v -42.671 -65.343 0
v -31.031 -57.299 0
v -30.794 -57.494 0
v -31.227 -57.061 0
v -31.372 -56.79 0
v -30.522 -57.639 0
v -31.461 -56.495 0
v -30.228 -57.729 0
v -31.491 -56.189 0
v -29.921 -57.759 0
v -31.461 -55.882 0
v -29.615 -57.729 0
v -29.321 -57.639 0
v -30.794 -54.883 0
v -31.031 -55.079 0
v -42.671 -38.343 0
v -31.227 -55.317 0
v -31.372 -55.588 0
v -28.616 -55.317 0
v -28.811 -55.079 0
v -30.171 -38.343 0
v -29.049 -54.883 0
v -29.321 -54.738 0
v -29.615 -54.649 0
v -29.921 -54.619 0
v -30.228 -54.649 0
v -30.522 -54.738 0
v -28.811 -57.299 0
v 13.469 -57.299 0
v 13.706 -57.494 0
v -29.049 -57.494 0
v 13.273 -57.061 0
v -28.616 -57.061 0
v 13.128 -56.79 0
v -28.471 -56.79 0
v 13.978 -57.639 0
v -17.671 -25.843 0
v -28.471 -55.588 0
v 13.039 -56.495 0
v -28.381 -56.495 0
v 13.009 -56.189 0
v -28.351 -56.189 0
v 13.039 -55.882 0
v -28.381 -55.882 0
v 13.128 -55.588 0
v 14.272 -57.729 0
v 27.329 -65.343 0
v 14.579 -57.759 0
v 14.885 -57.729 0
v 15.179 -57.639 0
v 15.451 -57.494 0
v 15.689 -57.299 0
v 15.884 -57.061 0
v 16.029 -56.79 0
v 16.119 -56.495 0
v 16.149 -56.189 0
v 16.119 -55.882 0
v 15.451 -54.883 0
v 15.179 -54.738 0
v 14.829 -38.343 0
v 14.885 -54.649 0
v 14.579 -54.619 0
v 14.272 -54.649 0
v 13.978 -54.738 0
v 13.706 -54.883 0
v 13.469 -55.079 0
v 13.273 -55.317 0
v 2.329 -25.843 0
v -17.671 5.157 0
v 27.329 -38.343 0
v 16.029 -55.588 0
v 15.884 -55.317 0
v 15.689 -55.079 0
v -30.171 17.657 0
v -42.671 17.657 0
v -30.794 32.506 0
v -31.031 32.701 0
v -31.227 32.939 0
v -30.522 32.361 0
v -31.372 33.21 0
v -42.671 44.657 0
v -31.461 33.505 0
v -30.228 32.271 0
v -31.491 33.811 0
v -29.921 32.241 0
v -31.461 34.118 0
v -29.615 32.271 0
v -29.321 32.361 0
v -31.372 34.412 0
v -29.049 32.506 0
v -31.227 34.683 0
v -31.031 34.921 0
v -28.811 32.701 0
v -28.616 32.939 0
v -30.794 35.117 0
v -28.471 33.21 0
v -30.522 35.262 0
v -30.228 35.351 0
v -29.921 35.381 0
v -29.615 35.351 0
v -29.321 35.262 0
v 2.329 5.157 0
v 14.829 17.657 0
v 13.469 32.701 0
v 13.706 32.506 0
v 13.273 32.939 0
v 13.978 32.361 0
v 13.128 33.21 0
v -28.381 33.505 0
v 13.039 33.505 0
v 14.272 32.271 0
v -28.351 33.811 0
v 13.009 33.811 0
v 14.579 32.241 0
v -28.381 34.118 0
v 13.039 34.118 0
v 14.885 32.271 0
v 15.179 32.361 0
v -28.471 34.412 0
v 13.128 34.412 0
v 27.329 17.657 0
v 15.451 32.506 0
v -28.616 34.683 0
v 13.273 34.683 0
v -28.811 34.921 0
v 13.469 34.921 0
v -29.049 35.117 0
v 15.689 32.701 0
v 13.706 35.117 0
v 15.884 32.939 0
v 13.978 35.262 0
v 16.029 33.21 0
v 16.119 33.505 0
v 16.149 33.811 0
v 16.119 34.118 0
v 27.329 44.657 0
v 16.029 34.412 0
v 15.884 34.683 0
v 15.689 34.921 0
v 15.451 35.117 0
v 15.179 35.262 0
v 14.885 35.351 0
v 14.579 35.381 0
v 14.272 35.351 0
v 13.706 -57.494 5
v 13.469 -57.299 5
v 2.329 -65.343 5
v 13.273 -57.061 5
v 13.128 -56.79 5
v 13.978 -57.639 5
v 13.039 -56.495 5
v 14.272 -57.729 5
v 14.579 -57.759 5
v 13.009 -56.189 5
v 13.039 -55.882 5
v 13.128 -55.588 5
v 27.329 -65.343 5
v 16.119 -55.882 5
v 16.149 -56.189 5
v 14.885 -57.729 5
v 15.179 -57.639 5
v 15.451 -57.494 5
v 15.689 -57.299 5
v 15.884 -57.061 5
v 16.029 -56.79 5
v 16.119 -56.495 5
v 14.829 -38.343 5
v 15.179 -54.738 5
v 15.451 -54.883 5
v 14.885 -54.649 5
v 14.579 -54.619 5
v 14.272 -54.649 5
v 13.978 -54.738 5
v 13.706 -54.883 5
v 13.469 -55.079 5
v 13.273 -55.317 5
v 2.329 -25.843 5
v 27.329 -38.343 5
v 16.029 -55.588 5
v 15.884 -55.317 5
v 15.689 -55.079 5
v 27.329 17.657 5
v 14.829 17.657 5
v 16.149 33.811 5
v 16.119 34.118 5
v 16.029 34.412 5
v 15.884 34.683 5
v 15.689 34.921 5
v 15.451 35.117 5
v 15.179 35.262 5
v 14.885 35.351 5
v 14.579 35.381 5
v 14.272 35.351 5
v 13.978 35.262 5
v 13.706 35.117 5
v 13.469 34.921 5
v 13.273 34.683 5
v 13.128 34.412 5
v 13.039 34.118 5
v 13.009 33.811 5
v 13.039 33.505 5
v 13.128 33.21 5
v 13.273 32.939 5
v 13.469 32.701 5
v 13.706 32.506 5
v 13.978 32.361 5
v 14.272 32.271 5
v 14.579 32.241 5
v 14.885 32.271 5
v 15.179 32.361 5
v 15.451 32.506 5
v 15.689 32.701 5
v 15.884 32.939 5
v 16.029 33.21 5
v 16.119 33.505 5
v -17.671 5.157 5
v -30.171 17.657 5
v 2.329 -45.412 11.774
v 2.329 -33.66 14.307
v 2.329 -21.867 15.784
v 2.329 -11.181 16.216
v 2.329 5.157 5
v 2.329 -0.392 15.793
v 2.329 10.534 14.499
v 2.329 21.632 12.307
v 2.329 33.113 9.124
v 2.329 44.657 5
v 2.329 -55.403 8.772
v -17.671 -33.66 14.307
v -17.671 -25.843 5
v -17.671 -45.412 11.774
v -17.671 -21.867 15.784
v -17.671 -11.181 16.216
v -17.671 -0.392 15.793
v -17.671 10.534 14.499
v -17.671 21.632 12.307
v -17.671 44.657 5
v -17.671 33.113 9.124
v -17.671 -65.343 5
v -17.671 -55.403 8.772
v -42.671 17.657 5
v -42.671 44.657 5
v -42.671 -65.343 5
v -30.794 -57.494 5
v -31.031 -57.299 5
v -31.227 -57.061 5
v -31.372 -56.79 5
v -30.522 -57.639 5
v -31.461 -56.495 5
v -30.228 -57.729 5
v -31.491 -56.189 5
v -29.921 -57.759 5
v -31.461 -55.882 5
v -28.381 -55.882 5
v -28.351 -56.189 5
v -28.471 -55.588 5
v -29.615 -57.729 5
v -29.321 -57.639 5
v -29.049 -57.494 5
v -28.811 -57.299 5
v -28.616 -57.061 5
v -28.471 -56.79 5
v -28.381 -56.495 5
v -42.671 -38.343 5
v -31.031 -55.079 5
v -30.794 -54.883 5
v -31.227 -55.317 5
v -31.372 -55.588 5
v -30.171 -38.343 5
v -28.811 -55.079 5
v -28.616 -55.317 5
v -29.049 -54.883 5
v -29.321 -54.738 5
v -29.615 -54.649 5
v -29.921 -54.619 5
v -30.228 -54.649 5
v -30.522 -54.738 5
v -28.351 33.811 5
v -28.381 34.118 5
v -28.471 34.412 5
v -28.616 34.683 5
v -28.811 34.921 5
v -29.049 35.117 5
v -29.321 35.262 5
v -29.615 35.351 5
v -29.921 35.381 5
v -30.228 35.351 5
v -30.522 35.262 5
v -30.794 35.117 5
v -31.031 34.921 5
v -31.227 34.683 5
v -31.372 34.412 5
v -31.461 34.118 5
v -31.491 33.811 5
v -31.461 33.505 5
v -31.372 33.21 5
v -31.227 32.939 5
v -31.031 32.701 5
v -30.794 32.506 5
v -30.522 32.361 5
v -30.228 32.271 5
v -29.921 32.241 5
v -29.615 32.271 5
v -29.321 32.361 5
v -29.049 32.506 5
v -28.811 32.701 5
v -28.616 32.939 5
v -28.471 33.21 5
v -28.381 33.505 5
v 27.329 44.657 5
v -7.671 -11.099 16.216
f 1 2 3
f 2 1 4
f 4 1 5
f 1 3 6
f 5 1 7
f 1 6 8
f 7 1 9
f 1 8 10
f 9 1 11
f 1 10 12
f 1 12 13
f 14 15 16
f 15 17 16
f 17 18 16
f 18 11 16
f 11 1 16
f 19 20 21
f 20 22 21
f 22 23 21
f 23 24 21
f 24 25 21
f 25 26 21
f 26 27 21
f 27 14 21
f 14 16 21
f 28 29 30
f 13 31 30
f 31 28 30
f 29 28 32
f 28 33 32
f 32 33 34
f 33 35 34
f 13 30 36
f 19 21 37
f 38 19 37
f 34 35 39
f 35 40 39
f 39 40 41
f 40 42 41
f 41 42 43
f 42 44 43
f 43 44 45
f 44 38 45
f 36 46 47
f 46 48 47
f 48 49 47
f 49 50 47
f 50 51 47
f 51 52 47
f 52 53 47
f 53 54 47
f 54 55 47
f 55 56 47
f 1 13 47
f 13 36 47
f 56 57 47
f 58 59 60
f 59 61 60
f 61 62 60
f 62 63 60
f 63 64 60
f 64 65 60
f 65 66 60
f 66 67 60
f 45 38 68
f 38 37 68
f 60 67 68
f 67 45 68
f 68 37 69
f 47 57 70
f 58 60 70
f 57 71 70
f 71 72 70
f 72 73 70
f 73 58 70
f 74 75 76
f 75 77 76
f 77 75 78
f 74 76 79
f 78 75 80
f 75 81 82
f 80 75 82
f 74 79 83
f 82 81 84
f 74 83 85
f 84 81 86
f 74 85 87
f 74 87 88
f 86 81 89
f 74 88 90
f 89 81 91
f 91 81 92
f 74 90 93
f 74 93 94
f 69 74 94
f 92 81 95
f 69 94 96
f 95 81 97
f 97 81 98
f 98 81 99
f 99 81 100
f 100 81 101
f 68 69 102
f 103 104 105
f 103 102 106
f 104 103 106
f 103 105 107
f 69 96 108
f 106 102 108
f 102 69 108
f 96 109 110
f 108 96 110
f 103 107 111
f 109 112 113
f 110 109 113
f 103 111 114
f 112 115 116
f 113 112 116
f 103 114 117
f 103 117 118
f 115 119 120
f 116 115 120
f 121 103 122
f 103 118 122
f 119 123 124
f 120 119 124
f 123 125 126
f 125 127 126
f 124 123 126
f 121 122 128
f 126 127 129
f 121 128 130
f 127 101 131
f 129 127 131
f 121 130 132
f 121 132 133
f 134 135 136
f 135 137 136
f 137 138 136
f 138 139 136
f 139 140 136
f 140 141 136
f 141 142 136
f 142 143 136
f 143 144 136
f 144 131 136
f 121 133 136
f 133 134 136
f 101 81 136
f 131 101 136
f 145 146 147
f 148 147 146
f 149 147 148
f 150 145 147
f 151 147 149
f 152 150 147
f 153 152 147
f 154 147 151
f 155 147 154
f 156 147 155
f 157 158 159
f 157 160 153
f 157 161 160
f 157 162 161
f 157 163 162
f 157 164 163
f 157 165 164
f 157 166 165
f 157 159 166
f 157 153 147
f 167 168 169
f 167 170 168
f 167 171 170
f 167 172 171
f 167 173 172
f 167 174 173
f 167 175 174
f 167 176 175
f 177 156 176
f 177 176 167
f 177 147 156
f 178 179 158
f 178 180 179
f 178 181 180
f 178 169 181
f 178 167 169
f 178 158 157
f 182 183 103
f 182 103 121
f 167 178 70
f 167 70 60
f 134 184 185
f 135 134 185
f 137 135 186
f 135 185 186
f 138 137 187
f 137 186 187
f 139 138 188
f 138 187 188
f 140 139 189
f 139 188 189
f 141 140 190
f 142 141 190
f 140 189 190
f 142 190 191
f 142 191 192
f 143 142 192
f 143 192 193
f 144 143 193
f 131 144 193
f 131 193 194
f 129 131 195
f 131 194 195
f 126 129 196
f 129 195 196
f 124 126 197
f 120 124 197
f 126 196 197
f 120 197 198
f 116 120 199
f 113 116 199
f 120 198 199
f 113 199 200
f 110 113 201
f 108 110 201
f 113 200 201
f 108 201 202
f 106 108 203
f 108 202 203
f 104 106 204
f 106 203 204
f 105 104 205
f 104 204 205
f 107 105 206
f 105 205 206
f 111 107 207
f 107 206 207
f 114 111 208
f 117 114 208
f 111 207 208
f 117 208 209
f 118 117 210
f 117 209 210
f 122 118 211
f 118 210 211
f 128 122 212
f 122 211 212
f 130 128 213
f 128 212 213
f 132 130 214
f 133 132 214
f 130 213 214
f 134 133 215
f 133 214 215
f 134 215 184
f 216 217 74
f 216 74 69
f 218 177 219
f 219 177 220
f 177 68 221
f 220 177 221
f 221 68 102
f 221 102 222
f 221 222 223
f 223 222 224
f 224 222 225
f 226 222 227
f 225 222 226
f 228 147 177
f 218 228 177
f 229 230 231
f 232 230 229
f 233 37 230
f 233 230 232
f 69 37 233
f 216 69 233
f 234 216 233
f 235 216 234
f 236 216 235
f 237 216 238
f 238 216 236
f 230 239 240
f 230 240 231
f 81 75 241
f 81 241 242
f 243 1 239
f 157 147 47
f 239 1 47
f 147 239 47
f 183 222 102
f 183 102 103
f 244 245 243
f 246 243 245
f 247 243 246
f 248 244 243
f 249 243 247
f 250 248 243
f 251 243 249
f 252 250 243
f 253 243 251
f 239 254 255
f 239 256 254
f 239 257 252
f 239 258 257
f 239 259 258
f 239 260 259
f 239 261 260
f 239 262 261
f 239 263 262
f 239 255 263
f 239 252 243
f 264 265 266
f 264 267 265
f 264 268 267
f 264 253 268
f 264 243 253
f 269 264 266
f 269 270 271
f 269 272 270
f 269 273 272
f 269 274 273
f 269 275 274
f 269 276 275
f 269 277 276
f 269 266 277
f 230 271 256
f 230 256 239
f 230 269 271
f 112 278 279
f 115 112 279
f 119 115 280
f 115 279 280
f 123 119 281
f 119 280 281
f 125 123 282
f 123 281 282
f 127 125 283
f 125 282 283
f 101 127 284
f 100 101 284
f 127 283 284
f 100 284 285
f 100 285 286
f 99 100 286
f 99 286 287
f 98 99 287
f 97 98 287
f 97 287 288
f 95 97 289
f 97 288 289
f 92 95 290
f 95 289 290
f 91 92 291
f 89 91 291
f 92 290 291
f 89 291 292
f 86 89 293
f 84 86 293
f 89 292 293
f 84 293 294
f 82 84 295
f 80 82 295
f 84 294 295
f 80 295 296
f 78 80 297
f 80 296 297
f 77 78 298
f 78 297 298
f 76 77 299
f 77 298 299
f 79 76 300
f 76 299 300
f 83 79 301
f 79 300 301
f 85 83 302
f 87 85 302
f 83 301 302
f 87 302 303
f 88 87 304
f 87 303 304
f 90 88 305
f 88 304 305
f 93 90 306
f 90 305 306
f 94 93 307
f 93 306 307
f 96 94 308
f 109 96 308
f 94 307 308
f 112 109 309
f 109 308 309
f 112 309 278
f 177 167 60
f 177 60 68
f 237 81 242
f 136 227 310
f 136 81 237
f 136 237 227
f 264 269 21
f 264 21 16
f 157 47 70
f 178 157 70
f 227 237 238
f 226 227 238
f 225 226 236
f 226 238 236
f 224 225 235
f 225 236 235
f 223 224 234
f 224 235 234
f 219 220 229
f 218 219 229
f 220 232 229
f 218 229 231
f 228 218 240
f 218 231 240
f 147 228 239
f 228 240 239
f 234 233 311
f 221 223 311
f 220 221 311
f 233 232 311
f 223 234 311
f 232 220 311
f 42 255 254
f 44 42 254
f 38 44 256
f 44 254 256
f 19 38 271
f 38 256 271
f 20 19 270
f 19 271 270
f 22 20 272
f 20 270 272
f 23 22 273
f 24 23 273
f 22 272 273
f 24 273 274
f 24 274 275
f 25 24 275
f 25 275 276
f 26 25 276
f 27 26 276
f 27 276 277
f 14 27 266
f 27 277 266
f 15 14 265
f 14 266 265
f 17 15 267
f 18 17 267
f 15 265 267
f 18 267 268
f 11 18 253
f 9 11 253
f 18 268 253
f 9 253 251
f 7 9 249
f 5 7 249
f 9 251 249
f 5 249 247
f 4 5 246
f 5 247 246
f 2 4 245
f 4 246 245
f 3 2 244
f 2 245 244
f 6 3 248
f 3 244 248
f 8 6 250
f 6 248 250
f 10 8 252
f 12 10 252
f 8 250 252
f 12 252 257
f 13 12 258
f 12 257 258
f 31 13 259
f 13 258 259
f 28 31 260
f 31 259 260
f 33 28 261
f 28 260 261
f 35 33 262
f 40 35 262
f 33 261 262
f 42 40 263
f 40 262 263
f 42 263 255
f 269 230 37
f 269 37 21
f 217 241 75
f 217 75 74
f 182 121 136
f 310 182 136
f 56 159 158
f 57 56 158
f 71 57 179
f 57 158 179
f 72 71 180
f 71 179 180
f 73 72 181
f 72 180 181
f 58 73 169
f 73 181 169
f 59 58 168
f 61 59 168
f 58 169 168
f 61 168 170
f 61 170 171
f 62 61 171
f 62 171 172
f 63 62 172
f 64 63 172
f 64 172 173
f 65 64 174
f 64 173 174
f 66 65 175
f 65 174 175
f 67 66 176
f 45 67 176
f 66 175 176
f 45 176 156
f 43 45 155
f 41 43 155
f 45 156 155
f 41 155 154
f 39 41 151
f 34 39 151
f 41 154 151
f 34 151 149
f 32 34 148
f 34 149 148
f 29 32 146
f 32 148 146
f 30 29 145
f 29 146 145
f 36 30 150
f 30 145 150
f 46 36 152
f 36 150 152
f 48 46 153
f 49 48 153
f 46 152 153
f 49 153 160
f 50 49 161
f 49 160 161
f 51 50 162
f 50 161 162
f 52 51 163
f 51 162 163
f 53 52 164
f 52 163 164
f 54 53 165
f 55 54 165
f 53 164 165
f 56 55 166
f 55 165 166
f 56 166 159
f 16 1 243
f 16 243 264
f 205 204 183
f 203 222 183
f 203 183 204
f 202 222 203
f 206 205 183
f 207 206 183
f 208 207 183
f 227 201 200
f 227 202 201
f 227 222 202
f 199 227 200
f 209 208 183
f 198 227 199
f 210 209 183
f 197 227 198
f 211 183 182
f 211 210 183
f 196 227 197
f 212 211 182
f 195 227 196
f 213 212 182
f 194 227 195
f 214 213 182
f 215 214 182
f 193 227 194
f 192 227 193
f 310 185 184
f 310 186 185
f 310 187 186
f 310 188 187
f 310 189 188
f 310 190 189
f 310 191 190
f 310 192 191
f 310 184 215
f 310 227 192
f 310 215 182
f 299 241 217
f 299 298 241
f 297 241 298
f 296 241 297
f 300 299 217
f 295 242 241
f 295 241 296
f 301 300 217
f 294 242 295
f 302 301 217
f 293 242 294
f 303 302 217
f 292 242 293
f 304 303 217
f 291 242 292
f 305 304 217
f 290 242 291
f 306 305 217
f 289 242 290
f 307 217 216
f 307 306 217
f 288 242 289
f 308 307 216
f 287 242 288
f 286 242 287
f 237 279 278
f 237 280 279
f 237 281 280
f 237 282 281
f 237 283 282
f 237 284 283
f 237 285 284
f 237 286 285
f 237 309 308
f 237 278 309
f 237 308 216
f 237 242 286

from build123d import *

# Parameters (mm, degrees)
SKETCH_1_W          = 70
SKETCH_1_H          = 110
EXTRUDE_1_DEPTH     = 5
SKETCH_2_R          = 1.57
CUT_EXTRUDE_1_DEPTH = 5
CUT_EXTRUDE_2_DEPTH = 5
EXTRUDE_START       = -20
EXTRUDE_3_DEPTH     = 20


with BuildPart() as part:
    # 草图1 → 凸台-拉伸1 (new body)
    with BuildSketch(Plane.XY):
        with Locations((-7.671321449, -10.342578999)):
            Rectangle(SKETCH_1_W, SKETCH_1_H)
    extrude(amount=EXTRUDE_1_DEPTH)

    # 草图2 → 切除-拉伸1 (cut)
    with BuildSketch(Plane.XY.offset(5)):
        with Locations((-29.921321449, 33.811245296)):
            Circle(SKETCH_2_R)
        with Locations((14.578678551, 33.811245296)):
            Circle(SKETCH_2_R)
        with Locations((-29.921321449, -56.188754704)):
            Circle(SKETCH_2_R)
        with Locations((14.578678551, -56.188754704)):
            Circle(SKETCH_2_R)
    extrude(amount=-CUT_EXTRUDE_1_DEPTH, mode=Mode.SUBTRACT)

    # 草图3 → 切除-拉伸2 (cut)
    with BuildSketch(Plane.XY.offset(5)):
        Polygon((-42.671321449, 17.657421001), (-30.171321449, 17.657421001), (-17.671321449, 5.157421001), (-17.671321449, -25.842578999), (-30.171321449, -38.342578999), (-42.671321449, -38.342578999), align=None)
        Polygon((14.828678551, 17.657421001), (27.328678551, 17.657421001), (27.328678551, -38.342578999), (14.828678551, -38.342578999), (2.328678551, -25.842578999), (2.328678551, 5.157421001), align=None)
    extrude(amount=-CUT_EXTRUDE_2_DEPTH, mode=Mode.SUBTRACT)

    # 草图6 → 凸台-拉伸3 (add)
    with BuildSketch(Plane(origin=(2.328678551, 0, 0), x_dir=(0, 0, -1), z_dir=(1, 0, 0)).offset(EXTRUDE_START)):
        with BuildLine():
            Line((-5, 44.657421001), (-5, -65.342578999))
            add(Edge.make_bspline(
                [(-5, 44.657421001), (-27.43165177, -11.855516643), (-5, -65.342578999)],
                knots=[0, 0, 0, 1, 1, 1], degree=2))
        make_face()
    extrude(amount=EXTRUDE_3_DEPTH)


solid = part.part
